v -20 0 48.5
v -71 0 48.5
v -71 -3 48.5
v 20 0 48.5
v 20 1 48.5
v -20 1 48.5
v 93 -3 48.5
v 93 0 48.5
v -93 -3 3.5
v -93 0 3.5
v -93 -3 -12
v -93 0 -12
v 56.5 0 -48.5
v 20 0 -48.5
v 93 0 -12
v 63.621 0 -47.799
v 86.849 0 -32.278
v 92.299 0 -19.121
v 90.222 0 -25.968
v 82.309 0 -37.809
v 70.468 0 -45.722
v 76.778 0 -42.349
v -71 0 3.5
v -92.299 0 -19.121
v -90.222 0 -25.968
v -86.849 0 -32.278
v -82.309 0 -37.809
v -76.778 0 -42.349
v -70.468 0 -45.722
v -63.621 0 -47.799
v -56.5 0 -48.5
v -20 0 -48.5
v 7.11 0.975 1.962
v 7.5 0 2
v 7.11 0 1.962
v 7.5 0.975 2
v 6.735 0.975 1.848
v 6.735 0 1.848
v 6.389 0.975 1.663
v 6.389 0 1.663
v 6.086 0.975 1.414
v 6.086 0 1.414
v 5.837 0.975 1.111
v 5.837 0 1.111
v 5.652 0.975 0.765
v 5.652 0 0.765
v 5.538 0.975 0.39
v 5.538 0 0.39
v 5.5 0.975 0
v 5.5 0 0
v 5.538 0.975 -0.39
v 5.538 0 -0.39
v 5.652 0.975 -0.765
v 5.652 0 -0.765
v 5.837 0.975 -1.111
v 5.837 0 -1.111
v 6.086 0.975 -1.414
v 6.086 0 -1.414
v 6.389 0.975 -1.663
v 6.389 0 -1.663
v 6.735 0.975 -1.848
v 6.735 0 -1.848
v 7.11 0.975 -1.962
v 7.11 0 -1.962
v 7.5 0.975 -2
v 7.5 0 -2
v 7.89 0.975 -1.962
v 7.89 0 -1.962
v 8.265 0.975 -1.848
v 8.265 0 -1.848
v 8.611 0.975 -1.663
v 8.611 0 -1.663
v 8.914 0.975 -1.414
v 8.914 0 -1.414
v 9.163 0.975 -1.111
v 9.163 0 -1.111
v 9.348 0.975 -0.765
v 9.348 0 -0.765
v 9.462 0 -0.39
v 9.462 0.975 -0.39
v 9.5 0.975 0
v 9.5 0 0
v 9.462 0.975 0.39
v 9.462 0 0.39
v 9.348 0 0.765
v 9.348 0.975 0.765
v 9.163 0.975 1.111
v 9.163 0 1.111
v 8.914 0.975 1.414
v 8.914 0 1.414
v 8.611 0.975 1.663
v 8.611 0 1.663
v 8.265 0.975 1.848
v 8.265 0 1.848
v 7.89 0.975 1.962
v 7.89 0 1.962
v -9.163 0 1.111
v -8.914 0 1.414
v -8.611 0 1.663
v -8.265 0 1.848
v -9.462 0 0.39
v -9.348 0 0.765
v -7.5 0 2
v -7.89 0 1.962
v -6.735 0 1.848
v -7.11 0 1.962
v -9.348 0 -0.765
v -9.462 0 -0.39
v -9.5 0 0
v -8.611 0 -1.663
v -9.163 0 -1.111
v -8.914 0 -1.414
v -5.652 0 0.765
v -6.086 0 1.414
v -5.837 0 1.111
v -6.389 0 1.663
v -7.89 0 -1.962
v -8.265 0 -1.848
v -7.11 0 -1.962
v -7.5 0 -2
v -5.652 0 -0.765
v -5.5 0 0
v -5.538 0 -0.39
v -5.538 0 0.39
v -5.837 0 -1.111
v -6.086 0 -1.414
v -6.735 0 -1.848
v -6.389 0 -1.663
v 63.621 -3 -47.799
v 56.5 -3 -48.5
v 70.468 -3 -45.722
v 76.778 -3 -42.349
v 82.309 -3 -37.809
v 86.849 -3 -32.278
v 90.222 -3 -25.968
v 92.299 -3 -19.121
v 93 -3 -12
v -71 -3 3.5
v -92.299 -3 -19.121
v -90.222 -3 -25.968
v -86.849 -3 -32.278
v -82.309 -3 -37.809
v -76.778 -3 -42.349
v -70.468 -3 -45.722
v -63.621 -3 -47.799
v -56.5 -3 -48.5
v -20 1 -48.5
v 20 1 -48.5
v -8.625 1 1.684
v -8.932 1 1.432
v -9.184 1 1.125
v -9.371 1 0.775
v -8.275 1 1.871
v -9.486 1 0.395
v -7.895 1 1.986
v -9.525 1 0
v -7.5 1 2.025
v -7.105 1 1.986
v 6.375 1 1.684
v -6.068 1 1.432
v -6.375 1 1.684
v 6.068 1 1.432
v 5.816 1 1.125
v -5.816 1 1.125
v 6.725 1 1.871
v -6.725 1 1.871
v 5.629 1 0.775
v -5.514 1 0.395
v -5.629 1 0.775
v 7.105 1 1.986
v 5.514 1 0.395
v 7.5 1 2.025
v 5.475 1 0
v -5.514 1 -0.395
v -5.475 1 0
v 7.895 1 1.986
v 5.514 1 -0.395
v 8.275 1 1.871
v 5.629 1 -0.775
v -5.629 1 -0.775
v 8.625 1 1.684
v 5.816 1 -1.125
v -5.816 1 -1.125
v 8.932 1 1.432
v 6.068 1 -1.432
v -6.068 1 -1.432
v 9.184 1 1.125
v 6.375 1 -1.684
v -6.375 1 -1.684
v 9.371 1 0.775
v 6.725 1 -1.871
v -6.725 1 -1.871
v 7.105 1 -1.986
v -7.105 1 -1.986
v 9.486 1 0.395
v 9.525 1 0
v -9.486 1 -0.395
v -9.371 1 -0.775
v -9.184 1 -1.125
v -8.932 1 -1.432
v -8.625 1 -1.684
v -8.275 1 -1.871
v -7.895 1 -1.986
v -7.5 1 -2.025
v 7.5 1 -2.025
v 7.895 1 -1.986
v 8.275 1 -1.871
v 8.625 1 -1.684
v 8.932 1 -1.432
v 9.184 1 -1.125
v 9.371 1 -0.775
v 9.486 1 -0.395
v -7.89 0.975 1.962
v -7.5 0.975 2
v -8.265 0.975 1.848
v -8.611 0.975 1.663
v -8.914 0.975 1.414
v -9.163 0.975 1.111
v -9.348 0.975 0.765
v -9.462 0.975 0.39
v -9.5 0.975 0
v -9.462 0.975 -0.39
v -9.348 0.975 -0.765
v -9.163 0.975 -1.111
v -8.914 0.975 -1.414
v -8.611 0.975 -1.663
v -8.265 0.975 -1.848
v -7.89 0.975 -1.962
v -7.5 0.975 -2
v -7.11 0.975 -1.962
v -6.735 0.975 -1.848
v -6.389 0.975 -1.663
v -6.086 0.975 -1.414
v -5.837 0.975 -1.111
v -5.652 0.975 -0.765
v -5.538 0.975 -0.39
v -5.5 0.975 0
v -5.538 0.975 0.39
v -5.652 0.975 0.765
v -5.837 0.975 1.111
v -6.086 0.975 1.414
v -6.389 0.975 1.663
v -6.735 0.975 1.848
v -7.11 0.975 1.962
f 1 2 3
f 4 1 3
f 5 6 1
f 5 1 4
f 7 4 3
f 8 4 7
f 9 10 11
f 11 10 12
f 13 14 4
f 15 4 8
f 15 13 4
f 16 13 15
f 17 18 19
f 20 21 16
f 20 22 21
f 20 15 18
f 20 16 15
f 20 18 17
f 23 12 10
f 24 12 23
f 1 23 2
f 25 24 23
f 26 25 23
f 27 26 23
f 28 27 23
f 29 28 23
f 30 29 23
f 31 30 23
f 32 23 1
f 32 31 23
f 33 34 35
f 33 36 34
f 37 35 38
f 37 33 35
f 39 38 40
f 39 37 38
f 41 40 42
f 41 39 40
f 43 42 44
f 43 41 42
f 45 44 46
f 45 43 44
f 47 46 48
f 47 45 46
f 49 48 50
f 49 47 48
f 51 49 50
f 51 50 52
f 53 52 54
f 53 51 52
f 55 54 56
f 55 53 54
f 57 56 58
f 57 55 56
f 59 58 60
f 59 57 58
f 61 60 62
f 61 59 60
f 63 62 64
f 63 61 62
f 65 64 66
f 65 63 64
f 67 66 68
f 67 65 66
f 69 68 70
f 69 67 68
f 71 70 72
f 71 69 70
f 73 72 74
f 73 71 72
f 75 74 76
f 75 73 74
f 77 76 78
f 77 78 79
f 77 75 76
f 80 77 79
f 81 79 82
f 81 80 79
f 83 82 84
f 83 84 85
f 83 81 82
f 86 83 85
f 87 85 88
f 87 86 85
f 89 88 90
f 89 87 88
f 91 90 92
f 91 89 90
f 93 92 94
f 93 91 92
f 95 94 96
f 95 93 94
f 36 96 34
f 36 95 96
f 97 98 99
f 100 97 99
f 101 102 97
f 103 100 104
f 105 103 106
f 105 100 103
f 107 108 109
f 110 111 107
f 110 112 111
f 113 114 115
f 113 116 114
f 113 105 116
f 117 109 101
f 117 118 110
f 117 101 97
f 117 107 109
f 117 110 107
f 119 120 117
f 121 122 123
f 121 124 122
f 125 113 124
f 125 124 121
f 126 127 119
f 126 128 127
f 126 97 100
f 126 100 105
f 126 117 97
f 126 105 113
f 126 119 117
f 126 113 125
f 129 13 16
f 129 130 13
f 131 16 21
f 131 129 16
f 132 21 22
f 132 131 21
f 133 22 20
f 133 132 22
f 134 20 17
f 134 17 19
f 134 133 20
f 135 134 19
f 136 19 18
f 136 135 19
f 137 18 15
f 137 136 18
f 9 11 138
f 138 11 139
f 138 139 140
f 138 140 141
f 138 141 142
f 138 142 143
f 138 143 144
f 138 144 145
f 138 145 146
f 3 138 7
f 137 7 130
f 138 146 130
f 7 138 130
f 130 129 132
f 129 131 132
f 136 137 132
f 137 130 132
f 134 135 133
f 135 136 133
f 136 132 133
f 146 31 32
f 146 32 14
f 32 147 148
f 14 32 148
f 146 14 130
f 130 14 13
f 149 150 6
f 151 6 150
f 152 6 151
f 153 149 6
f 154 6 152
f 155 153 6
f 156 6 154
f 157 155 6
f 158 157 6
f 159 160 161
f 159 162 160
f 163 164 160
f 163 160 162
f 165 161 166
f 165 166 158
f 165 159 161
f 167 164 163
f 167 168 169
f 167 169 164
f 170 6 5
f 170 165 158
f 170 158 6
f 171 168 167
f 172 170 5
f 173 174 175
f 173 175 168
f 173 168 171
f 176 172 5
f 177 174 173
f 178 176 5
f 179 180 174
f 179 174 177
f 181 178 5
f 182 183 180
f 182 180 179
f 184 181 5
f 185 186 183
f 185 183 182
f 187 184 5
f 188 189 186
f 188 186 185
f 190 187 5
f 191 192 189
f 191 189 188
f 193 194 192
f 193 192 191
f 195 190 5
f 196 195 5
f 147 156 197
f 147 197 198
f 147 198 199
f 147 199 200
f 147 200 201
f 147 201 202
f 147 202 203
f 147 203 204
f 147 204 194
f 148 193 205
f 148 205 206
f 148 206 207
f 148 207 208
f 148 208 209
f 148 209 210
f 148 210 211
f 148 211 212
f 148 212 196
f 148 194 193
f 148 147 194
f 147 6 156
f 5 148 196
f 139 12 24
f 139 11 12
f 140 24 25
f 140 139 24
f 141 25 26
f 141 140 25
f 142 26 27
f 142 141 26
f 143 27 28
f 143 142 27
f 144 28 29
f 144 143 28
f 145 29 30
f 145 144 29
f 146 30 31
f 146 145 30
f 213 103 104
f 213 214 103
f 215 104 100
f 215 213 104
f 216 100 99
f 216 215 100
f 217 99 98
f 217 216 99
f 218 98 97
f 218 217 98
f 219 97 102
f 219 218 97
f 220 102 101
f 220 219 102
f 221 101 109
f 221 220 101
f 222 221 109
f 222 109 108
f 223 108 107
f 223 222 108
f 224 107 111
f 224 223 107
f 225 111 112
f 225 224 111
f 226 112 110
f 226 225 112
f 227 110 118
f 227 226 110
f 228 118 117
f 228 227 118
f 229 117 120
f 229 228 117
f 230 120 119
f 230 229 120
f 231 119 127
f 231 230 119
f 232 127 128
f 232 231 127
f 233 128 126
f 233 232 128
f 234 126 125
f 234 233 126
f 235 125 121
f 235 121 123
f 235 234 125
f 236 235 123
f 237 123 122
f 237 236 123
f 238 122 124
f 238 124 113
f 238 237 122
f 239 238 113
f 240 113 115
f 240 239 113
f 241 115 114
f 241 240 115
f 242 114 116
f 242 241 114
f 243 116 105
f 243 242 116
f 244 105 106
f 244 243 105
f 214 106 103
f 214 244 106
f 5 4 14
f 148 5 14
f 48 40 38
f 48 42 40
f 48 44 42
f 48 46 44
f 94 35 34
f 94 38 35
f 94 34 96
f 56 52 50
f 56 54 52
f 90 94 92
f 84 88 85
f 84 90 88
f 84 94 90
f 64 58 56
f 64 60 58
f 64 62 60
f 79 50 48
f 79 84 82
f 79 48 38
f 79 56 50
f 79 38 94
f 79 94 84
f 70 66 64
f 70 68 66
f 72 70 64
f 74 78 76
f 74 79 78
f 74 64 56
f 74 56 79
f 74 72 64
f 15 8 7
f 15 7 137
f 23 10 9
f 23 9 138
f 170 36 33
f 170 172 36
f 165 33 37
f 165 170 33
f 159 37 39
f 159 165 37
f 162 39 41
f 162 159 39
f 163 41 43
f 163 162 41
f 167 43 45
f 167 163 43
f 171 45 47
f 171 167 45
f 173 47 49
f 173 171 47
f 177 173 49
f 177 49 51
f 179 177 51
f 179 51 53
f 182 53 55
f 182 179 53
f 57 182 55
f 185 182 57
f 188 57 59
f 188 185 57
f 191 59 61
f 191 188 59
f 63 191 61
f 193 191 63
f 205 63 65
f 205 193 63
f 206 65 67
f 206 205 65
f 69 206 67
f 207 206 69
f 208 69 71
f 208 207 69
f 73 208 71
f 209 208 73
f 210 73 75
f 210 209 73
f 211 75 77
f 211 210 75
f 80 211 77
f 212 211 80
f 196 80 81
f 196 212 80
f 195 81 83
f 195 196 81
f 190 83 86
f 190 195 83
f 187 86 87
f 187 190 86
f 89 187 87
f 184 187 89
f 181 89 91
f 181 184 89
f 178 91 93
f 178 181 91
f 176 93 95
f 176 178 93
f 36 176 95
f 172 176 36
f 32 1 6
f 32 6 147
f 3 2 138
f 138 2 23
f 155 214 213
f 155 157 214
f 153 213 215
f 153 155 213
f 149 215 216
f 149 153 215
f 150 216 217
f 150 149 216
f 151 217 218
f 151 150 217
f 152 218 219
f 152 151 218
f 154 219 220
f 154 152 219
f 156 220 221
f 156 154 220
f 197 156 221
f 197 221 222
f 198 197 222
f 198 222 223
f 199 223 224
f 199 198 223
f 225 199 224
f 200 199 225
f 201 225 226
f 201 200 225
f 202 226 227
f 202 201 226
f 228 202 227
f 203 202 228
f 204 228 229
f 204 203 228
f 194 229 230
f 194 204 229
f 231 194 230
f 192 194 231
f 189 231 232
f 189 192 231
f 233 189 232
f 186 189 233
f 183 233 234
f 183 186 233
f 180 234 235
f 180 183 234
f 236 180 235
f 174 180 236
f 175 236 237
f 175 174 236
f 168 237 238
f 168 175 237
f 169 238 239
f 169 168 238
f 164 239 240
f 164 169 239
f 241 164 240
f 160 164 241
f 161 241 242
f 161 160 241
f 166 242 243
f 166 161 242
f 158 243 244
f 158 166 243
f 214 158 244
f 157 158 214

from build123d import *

# Parameters (mm, degrees)
SKETCH_1_W           = 40
SKETCH_1_H           = 97
EXTRUDE_1_DEPTH      = 1
F_4_0MM_1_AT_2_COUNT = 2
F_4_0MM_1_AT_2_PITCH = 15
EXTRUDE_START        = -1
SKETCH_6_2_W         = 186
SKETCH_6_2_H         = 97
EXTRUDE_3_DEPTH      = 3
FILLET_2_R           = 36.5
SKETCH_8_W           = 22
SKETCH_8_H           = 45
CUT_EXTRUDE_2_DEPTH  = 105.929738397


with BuildPart() as part:
    # 草圖1 → 填料-伸長1 (new body)
    with BuildSketch(Plane(origin=(0, 0, 0), x_dir=(1, 0, 0), z_dir=(0, 1, 0))):
        Rectangle(SKETCH_1_W, SKETCH_1_H)
    extrude(amount=EXTRUDE_1_DEPTH)

    # 草圖5 → Ø4.0mm 定位孔1 (revolve, cut)
    with BuildSketch(Plane(origin=(7.5, 1, 0), x_dir=(0, 0, 1), z_dir=(1, 0, 0))):
        Polygon((0, 0), (0, 1), (2, 1), (2, 0.025), (2.025, 0), align=None)
    f_4_0mm_1 = revolve(axis=Axis((7.5, 7.35, 0), (0, -1, 0)), mode=Mode.SUBTRACT)

    # Ø4.0mm 定位孔1 at 2: Ø4.0mm 定位孔1 ×2
    with Locations(*[(-i * F_4_0MM_1_AT_2_PITCH, 0, 0) for i in range(1, F_4_0MM_1_AT_2_COUNT)]):
        add(f_4_0mm_1, mode=Mode.SUBTRACT)

    # 草圖6<2> → 填料-伸長3 (add)
    with BuildSketch(Plane(origin=(0, 1, 0), x_dir=(1, 0, 0), z_dir=(0, 1, 0)).offset(EXTRUDE_START)):
        Rectangle(SKETCH_6_2_W, SKETCH_6_2_H)
    extrude(amount=-EXTRUDE_3_DEPTH)

    # 圓角2
    fillet_2_edges = [part.edges().sort_by_distance(p)[0] for p in [
        (-93, -1.5, -48.5),
        (93, -1.5, -48.5),
    ]]
    fillet(fillet_2_edges, radius=FILLET_2_R)

    # 草圖8 → 除料-伸長2 (cut, through all)
    with BuildSketch(Plane(origin=(0, 0, 0), x_dir=(1, 0, 0), z_dir=(0, 1, 0))):
        with Locations((-82, -26)):
            Rectangle(SKETCH_8_W, SKETCH_8_H)
    extrude(amount=-CUT_EXTRUDE_2_DEPTH, mode=Mode.SUBTRACT)


solid = part.part
